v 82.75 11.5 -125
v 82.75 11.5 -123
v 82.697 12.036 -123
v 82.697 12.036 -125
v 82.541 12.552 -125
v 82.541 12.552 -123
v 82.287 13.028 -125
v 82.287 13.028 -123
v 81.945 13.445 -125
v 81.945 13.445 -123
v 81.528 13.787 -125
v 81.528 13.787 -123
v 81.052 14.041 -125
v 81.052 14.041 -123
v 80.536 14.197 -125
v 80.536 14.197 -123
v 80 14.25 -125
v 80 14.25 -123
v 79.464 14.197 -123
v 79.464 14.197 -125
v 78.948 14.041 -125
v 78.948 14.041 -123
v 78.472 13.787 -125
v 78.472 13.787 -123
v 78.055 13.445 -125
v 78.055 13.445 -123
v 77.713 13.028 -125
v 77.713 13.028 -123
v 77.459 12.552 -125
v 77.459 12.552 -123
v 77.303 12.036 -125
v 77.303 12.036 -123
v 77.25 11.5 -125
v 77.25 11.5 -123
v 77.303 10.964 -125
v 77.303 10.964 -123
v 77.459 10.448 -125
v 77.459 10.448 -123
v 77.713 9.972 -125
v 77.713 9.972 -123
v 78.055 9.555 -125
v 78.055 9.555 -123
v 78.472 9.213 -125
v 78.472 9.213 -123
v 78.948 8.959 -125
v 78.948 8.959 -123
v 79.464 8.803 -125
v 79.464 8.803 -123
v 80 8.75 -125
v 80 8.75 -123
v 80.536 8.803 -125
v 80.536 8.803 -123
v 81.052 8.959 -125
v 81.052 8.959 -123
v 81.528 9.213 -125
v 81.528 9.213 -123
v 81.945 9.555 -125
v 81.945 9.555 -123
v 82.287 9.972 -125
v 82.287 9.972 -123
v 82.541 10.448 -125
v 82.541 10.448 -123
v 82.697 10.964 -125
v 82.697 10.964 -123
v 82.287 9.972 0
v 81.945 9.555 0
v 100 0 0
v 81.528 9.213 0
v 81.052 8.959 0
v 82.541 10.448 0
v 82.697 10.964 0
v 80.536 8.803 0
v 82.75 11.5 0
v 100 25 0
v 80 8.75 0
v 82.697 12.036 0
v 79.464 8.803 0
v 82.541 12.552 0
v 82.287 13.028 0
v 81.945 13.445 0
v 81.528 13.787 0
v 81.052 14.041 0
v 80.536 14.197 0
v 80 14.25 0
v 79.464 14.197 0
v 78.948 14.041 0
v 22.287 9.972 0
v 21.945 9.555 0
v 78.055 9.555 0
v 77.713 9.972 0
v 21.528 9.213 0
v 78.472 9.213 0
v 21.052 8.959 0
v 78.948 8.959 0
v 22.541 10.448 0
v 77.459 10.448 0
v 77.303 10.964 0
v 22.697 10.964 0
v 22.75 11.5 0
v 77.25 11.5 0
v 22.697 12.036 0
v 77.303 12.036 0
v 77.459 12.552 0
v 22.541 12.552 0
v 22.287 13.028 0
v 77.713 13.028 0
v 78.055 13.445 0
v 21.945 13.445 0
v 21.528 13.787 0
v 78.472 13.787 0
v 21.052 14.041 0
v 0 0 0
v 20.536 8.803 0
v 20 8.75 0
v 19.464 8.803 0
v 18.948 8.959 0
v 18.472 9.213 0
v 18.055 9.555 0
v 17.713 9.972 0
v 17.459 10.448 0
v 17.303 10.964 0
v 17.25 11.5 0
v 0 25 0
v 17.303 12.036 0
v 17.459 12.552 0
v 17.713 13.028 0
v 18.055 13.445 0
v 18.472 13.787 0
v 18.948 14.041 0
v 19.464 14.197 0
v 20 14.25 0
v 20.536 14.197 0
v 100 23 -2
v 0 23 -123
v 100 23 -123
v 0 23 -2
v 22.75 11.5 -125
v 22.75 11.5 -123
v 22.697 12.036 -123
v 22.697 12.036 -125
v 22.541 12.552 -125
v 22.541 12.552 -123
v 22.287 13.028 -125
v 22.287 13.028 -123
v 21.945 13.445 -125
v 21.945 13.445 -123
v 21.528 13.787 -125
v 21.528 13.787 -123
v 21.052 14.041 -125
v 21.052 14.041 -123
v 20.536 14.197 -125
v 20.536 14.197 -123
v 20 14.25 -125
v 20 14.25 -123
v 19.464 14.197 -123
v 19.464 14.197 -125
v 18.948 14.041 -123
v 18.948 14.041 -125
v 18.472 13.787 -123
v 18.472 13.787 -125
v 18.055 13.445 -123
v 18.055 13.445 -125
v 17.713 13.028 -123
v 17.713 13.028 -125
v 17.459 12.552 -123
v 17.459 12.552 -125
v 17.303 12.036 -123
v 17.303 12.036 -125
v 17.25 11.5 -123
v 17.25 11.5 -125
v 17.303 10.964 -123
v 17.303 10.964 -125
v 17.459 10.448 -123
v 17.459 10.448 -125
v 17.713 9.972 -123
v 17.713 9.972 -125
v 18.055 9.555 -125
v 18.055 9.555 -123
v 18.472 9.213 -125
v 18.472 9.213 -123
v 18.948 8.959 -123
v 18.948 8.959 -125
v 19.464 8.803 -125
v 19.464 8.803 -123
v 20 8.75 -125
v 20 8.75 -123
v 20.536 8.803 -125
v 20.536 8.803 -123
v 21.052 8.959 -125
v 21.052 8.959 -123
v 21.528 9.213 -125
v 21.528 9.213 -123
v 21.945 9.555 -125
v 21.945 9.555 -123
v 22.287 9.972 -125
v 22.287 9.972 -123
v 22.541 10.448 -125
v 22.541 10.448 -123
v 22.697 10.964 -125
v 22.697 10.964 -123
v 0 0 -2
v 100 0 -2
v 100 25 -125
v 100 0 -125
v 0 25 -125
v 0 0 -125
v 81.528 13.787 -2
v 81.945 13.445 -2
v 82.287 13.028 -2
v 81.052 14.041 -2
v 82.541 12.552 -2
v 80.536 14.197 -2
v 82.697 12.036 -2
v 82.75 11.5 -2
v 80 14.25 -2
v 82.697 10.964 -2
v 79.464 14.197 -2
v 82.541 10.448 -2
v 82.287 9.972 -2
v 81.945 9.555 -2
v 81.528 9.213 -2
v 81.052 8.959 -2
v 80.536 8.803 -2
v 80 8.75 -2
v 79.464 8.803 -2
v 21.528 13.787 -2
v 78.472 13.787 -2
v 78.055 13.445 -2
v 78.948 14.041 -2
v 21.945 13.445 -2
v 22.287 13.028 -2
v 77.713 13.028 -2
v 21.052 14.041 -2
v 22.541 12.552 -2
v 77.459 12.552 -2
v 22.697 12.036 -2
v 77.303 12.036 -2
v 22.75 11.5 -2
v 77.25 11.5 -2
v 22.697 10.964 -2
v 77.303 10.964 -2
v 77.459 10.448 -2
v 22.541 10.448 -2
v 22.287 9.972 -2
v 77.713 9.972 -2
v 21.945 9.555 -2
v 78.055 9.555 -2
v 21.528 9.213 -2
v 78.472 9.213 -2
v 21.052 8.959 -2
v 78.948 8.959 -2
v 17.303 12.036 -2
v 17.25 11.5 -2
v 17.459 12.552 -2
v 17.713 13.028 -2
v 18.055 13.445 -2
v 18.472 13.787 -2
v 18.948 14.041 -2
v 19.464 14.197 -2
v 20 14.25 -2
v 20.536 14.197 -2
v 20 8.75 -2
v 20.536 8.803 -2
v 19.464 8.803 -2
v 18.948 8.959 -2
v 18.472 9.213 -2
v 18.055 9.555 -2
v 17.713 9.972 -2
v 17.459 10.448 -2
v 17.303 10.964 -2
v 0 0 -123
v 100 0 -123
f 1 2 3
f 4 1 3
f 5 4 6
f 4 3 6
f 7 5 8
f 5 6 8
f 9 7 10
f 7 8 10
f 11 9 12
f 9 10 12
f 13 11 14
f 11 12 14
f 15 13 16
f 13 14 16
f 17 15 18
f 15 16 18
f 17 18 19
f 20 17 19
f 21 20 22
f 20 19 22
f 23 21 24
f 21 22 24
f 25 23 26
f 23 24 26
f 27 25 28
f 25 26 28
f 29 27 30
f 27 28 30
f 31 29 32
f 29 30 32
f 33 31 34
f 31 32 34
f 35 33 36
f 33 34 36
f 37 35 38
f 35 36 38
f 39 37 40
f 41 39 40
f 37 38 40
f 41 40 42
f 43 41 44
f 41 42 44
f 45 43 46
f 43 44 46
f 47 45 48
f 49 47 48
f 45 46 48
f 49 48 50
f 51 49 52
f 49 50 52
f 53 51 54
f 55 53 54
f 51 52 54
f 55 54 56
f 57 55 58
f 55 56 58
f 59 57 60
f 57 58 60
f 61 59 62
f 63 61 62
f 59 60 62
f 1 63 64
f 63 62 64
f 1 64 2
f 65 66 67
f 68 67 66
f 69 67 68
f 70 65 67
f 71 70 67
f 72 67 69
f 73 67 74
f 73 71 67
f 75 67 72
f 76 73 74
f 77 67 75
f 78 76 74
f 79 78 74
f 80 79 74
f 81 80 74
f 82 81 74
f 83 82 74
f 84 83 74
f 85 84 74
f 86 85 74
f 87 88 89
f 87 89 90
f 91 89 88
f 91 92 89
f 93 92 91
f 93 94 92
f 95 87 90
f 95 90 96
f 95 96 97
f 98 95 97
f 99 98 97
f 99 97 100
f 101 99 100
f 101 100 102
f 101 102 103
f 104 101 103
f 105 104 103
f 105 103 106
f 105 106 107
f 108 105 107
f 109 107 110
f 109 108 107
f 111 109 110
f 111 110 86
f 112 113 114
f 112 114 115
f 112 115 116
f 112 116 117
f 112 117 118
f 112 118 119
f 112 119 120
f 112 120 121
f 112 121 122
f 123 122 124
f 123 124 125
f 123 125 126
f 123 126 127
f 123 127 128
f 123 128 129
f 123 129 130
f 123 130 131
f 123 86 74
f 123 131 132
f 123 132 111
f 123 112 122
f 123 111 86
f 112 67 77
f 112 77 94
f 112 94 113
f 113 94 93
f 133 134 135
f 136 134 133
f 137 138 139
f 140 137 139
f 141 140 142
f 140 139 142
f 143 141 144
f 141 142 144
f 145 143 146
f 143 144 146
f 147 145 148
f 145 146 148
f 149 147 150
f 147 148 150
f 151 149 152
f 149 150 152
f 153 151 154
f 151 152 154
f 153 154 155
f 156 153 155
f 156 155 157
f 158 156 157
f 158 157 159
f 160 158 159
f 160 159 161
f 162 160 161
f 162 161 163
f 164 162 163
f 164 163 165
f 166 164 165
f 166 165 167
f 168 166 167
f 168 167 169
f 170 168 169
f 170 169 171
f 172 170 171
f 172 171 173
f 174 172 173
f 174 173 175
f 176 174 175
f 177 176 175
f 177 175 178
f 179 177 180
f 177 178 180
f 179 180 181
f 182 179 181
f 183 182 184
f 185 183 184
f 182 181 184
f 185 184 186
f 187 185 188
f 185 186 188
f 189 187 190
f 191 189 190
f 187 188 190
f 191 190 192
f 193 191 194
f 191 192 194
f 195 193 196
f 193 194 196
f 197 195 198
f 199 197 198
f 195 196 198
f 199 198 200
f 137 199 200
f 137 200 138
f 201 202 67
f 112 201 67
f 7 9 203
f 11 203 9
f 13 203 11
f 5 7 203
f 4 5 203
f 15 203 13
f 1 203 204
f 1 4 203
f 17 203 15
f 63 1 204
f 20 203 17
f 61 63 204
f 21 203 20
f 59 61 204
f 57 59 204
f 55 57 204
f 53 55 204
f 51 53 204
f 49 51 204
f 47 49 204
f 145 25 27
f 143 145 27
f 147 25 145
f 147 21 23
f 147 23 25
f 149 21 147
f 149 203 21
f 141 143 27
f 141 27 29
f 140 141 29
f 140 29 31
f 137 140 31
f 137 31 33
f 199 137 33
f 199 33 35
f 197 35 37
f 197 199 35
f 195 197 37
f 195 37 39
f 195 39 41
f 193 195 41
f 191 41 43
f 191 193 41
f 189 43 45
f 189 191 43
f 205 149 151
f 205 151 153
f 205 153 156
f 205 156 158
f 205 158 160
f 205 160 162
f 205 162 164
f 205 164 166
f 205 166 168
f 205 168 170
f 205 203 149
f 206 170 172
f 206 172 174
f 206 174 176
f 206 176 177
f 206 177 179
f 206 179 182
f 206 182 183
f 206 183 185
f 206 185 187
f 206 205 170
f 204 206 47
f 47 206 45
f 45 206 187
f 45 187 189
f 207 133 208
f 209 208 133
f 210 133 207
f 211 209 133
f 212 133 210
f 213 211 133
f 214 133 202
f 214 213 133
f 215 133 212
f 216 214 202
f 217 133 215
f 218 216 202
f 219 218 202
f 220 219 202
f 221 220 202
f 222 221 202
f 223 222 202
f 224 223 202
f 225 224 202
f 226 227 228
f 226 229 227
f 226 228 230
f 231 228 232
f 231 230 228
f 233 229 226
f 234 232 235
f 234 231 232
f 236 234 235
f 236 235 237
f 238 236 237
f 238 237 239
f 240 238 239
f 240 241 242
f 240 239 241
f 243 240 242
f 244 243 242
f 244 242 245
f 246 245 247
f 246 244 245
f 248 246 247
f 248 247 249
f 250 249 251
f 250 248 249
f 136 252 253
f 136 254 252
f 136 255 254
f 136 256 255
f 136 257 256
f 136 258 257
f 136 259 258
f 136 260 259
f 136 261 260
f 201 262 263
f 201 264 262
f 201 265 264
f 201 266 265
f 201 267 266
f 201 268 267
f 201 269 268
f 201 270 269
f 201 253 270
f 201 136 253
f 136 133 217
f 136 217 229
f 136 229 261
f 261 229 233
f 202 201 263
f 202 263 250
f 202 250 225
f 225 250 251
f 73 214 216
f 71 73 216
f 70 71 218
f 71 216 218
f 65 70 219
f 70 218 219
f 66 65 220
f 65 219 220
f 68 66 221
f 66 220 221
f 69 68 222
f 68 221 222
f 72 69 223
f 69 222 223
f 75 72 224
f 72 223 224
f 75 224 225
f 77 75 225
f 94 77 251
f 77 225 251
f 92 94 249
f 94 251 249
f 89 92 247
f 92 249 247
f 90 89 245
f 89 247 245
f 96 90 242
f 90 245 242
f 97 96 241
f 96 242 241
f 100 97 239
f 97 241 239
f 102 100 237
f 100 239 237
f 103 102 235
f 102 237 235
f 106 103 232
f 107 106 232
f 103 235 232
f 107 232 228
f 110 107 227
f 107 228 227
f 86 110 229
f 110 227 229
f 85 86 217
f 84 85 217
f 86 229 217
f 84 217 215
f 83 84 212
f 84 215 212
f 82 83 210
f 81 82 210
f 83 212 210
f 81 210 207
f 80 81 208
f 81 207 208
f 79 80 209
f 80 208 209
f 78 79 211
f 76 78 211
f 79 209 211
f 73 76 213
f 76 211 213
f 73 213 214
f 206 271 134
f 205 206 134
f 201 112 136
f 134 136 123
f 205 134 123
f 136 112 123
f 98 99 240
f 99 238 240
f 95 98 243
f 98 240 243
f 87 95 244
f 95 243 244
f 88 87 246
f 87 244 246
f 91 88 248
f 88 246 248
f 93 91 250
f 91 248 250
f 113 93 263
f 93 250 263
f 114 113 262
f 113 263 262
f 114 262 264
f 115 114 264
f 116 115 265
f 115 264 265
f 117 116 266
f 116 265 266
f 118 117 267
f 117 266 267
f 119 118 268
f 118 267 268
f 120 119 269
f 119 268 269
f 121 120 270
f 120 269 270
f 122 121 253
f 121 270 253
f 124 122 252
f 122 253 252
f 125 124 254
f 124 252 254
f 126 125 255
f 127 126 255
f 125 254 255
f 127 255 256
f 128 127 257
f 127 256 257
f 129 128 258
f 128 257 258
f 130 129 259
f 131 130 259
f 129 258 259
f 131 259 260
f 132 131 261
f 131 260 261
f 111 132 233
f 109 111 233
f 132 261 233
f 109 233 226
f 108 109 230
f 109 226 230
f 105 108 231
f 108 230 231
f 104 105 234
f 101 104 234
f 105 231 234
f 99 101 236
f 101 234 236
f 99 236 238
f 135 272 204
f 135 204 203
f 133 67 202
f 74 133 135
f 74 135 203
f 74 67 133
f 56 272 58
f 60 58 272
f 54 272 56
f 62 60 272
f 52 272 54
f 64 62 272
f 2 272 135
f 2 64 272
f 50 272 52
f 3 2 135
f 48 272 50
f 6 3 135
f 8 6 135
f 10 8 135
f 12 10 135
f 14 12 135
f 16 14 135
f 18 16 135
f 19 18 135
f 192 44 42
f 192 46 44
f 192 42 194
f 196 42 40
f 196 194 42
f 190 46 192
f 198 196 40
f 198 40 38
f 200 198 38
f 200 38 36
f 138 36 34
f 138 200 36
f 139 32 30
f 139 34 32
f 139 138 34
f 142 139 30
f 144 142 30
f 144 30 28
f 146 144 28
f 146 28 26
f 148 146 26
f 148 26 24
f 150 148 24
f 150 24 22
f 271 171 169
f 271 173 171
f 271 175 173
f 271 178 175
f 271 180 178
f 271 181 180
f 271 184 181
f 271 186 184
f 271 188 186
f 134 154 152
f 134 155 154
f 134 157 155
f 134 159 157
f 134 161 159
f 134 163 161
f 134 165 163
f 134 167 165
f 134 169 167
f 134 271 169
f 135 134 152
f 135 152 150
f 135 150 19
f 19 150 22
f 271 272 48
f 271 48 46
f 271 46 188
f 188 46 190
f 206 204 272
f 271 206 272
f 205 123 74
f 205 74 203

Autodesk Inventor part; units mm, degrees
ref_plane "YZ Plane" through (0, 0, 0) normal (1, 0, 0) x (0, 1, 0)
ref_plane "XZ Plane" through (0, 0, 0) normal (0, 1, 0) x (-1, 0, 0)
ref_plane "XY Plane" through (0, 0, 0) normal (0, 0, 1) x (1, 0, 0)
sketch "Sketch1" plane through (0, 0, 0) normal (1, 0, 0) x (0, 1, 0)
  line L0 (0, 0) -> (25, 0)
  line L1 (25, 0) -> (25, -125)
  line L2 (25, -125) -> (0, -125)
  line L3 (0, -125) -> (0, -123)
  line L4 (0, -123) -> (23, -123)
  line L5 (23, -123) -> (23, -2)
  line L6 (23, -2) -> (0, -2)
  line L7 (0, -2) -> (0, 0)
  dimension "d0" = 2
  dimension "d1" = 2
  dimension "d2" = 125
  dimension "d3" = 25
  dimension "d4" = 2
extrude "Extrusion1" add sketch "Sketch1" along normal blind 100
sketch "Sketch2" plane through (0, 0, -123) normal (0, 0, 1) x (1, 0, 0)
  circle A0 centre (80, 11.5) radius 2.75
  line L0 (0, 23) -> (100, 23) projected
  line L1 (100, 23) -> (100, 0) projected
  circle A1 centre (20, 11.5) radius 2.75
  line L2 (0, 0) -> (100, 0) projected
  line L3 (0, 0) -> (0, 23) projected
  dimension "d7" = 5.5
  dimension "d8" = 11.5
  dimension "d9" = 20
  dimension "d10" = 5.5
  dimension "d11" = 11.5
  dimension "d12" = 20
extrude "Extrusion2" cut sketch "Sketch2" along normal blind 139.25 and the other way blind 73.375 contours A0 | A1
properties part number "Spacer Extrusion" material "Aluminum 6061"
